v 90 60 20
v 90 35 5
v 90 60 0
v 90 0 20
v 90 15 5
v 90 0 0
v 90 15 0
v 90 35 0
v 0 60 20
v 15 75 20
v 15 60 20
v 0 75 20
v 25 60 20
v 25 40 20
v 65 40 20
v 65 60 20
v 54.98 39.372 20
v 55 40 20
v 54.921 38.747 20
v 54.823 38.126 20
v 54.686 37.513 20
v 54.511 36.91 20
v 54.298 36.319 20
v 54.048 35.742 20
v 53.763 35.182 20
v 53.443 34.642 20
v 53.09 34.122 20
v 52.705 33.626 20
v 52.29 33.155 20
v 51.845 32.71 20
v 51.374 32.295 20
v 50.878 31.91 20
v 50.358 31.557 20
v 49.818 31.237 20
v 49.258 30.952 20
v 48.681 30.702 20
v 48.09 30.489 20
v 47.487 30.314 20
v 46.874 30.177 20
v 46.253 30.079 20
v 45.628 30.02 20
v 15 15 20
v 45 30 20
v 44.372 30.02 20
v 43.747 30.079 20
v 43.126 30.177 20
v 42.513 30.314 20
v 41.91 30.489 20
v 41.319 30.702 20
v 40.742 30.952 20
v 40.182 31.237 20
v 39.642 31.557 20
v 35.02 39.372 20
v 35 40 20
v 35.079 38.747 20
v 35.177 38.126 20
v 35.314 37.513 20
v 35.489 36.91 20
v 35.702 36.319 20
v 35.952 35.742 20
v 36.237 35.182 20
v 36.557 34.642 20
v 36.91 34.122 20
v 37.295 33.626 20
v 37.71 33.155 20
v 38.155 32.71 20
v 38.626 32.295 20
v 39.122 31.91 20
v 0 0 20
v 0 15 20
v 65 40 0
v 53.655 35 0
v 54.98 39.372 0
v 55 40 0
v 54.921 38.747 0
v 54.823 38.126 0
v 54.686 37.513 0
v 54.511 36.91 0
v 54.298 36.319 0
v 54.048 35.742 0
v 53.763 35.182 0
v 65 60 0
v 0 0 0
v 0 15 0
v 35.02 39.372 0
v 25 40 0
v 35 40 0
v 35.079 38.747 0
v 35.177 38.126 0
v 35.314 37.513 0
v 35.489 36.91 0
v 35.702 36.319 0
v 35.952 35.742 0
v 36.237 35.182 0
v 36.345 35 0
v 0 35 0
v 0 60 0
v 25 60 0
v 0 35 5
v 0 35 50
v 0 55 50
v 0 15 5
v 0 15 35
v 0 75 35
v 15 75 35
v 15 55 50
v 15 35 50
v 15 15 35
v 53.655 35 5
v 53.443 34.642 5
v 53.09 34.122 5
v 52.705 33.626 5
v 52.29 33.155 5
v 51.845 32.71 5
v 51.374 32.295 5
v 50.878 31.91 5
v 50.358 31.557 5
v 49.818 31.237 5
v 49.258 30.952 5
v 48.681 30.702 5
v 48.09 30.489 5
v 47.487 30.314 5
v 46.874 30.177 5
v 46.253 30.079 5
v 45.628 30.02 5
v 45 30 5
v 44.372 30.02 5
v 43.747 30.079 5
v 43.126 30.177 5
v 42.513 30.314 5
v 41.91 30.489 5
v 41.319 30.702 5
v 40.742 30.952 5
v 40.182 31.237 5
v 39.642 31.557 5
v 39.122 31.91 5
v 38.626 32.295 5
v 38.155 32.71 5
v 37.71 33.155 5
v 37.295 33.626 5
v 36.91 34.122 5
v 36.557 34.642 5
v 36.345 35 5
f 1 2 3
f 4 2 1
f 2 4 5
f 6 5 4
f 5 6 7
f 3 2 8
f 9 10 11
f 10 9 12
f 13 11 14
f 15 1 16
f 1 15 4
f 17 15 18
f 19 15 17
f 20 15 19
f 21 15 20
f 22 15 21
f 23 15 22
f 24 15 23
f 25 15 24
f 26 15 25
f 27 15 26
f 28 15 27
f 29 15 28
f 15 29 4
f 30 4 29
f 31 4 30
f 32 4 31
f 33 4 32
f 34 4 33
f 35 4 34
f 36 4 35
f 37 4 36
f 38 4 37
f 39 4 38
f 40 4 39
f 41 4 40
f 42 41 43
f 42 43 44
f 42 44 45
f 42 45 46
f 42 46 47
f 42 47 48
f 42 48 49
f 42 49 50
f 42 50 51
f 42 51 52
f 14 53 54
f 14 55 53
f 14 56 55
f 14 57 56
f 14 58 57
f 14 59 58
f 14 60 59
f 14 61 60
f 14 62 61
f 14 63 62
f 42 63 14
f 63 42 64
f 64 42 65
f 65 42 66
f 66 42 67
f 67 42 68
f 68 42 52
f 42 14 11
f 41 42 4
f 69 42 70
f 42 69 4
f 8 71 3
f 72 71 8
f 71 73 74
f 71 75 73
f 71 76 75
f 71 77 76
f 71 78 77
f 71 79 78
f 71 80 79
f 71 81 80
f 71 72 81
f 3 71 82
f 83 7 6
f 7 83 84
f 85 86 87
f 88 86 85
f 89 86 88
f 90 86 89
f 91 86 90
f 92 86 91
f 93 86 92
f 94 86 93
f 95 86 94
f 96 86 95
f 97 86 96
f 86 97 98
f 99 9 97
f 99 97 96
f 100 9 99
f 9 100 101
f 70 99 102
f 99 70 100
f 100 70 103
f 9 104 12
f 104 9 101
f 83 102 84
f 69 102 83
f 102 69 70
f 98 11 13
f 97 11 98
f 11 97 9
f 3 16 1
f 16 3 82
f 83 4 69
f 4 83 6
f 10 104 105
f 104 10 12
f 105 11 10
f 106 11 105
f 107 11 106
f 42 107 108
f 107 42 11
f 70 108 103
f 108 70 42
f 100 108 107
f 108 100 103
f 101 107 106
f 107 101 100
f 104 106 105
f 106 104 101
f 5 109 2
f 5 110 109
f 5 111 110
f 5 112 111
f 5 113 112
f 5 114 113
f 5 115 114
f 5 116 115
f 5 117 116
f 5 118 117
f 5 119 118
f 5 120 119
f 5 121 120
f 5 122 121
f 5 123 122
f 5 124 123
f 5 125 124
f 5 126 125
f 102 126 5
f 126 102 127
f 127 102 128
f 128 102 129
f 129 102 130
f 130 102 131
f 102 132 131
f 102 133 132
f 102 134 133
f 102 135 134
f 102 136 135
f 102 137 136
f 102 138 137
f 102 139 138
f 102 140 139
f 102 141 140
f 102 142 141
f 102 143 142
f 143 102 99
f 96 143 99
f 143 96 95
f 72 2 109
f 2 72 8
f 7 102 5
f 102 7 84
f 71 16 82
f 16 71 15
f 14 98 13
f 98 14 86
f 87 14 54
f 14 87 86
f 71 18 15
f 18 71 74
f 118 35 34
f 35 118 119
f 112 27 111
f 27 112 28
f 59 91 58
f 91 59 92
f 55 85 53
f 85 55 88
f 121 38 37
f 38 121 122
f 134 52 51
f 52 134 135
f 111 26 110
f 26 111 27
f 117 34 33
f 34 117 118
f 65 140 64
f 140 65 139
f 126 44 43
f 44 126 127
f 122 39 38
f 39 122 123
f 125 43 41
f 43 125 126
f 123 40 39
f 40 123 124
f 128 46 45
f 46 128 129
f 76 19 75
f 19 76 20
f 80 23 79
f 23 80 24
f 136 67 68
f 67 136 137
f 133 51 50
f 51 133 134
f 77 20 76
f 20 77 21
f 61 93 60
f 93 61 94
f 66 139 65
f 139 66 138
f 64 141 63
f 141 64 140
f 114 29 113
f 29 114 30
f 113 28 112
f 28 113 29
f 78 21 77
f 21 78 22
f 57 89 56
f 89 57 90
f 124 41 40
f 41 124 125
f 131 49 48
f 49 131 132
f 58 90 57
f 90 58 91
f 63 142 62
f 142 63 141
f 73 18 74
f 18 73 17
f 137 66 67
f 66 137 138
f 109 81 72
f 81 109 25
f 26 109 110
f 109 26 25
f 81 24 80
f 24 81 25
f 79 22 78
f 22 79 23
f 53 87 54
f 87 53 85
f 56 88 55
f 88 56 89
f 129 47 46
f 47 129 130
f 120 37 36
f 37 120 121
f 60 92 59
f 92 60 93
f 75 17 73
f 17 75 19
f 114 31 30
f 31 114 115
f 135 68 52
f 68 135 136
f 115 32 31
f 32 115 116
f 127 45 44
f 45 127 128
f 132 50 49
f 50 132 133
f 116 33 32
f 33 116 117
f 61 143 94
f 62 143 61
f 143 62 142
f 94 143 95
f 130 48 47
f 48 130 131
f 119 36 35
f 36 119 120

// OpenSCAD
// ================================================
// MÔ HÌNH CAD 3D TỪ BẢN VẼ KỸ THUẬT
// Đơn vị: mm
// ================================================

$fn = 100; // Độ mịn cho các mặt cong

// Thông số kích thước chính
total_x = 90;
total_y = 60;
total_z = 50;
base_z  = 20;

// Rãnh đáy dưới (Bottom Groove)
groove_y_start = 15;
groove_y_width = 20;
groove_h       = 5;

// Vách đứng (Back Wall)
wall_thick   = 15;
wall_top_w   = 20;
wall_bot_w   = 60; // từ X=15 đến X=75
wall_slope_h = 15;
hole_dia     = 18;
hole_z       = 35;

// Rãnh khuyết phía trước (Front Cutout)
front_cut_w  = 40;
front_cut_d  = 20;
front_cut_r  = 10;

module object_3d() {
    difference() {
        union() {
            // 1. Khối đế chính (Base block)
            cube([total_x, total_y, base_z]);
            
            // 2. Vách đứng phía sau (Back Upright Wall)
            translate([0, 0, base_z])
                rotate([90, 0, 90])
                    linear_extrude(height = wall_thick)
                        polygon(points = [
                            [0, 0],
                            [total_x, 0],
                            [total_x, 0], 
                            [15 + wall_bot_w, 0],
                            [15 + wall_bot_w, 15],
                            [45 + wall_top_w/2, 30],
                            [45 - wall_top_w/2, 30],
                            [15, 15],
                            [15, 0]
                        ]);
        }
        
        // --- CÁC PHẦN CẮT BỎ (SUBTRACTIONS) ---
        
        // A. Rãnh chạy dọc phía dưới đáy (Bottom Channel along X)
        translate([-1, groove_y_start, -1])
            cube([total_x + 2, groove_y_width, groove_h + 1]);
            
        // B. Lỗ tròn Ø18 trên vách đứng
        translate([total_x/2, -1, hole_z])
            rotate([-90, 0, 0])
                cylinder(d = hole_dia, h = wall_thick + 2);
                
        // C. Khuyết mặt trước (Rõng chữ U + R10)
        translate([(total_x - front_cut_w)/2, total_y - front_cut_d, -1])
            cube([front_cut_w, front_cut_d + 1, base_z + 2]);
            
        translate([total_x/2, total_y - front_cut_d, -1])
            cylinder(r = front_cut_r, h = base_z + 2);
    }
}

// Hiển thị mô hình
object_3d();
